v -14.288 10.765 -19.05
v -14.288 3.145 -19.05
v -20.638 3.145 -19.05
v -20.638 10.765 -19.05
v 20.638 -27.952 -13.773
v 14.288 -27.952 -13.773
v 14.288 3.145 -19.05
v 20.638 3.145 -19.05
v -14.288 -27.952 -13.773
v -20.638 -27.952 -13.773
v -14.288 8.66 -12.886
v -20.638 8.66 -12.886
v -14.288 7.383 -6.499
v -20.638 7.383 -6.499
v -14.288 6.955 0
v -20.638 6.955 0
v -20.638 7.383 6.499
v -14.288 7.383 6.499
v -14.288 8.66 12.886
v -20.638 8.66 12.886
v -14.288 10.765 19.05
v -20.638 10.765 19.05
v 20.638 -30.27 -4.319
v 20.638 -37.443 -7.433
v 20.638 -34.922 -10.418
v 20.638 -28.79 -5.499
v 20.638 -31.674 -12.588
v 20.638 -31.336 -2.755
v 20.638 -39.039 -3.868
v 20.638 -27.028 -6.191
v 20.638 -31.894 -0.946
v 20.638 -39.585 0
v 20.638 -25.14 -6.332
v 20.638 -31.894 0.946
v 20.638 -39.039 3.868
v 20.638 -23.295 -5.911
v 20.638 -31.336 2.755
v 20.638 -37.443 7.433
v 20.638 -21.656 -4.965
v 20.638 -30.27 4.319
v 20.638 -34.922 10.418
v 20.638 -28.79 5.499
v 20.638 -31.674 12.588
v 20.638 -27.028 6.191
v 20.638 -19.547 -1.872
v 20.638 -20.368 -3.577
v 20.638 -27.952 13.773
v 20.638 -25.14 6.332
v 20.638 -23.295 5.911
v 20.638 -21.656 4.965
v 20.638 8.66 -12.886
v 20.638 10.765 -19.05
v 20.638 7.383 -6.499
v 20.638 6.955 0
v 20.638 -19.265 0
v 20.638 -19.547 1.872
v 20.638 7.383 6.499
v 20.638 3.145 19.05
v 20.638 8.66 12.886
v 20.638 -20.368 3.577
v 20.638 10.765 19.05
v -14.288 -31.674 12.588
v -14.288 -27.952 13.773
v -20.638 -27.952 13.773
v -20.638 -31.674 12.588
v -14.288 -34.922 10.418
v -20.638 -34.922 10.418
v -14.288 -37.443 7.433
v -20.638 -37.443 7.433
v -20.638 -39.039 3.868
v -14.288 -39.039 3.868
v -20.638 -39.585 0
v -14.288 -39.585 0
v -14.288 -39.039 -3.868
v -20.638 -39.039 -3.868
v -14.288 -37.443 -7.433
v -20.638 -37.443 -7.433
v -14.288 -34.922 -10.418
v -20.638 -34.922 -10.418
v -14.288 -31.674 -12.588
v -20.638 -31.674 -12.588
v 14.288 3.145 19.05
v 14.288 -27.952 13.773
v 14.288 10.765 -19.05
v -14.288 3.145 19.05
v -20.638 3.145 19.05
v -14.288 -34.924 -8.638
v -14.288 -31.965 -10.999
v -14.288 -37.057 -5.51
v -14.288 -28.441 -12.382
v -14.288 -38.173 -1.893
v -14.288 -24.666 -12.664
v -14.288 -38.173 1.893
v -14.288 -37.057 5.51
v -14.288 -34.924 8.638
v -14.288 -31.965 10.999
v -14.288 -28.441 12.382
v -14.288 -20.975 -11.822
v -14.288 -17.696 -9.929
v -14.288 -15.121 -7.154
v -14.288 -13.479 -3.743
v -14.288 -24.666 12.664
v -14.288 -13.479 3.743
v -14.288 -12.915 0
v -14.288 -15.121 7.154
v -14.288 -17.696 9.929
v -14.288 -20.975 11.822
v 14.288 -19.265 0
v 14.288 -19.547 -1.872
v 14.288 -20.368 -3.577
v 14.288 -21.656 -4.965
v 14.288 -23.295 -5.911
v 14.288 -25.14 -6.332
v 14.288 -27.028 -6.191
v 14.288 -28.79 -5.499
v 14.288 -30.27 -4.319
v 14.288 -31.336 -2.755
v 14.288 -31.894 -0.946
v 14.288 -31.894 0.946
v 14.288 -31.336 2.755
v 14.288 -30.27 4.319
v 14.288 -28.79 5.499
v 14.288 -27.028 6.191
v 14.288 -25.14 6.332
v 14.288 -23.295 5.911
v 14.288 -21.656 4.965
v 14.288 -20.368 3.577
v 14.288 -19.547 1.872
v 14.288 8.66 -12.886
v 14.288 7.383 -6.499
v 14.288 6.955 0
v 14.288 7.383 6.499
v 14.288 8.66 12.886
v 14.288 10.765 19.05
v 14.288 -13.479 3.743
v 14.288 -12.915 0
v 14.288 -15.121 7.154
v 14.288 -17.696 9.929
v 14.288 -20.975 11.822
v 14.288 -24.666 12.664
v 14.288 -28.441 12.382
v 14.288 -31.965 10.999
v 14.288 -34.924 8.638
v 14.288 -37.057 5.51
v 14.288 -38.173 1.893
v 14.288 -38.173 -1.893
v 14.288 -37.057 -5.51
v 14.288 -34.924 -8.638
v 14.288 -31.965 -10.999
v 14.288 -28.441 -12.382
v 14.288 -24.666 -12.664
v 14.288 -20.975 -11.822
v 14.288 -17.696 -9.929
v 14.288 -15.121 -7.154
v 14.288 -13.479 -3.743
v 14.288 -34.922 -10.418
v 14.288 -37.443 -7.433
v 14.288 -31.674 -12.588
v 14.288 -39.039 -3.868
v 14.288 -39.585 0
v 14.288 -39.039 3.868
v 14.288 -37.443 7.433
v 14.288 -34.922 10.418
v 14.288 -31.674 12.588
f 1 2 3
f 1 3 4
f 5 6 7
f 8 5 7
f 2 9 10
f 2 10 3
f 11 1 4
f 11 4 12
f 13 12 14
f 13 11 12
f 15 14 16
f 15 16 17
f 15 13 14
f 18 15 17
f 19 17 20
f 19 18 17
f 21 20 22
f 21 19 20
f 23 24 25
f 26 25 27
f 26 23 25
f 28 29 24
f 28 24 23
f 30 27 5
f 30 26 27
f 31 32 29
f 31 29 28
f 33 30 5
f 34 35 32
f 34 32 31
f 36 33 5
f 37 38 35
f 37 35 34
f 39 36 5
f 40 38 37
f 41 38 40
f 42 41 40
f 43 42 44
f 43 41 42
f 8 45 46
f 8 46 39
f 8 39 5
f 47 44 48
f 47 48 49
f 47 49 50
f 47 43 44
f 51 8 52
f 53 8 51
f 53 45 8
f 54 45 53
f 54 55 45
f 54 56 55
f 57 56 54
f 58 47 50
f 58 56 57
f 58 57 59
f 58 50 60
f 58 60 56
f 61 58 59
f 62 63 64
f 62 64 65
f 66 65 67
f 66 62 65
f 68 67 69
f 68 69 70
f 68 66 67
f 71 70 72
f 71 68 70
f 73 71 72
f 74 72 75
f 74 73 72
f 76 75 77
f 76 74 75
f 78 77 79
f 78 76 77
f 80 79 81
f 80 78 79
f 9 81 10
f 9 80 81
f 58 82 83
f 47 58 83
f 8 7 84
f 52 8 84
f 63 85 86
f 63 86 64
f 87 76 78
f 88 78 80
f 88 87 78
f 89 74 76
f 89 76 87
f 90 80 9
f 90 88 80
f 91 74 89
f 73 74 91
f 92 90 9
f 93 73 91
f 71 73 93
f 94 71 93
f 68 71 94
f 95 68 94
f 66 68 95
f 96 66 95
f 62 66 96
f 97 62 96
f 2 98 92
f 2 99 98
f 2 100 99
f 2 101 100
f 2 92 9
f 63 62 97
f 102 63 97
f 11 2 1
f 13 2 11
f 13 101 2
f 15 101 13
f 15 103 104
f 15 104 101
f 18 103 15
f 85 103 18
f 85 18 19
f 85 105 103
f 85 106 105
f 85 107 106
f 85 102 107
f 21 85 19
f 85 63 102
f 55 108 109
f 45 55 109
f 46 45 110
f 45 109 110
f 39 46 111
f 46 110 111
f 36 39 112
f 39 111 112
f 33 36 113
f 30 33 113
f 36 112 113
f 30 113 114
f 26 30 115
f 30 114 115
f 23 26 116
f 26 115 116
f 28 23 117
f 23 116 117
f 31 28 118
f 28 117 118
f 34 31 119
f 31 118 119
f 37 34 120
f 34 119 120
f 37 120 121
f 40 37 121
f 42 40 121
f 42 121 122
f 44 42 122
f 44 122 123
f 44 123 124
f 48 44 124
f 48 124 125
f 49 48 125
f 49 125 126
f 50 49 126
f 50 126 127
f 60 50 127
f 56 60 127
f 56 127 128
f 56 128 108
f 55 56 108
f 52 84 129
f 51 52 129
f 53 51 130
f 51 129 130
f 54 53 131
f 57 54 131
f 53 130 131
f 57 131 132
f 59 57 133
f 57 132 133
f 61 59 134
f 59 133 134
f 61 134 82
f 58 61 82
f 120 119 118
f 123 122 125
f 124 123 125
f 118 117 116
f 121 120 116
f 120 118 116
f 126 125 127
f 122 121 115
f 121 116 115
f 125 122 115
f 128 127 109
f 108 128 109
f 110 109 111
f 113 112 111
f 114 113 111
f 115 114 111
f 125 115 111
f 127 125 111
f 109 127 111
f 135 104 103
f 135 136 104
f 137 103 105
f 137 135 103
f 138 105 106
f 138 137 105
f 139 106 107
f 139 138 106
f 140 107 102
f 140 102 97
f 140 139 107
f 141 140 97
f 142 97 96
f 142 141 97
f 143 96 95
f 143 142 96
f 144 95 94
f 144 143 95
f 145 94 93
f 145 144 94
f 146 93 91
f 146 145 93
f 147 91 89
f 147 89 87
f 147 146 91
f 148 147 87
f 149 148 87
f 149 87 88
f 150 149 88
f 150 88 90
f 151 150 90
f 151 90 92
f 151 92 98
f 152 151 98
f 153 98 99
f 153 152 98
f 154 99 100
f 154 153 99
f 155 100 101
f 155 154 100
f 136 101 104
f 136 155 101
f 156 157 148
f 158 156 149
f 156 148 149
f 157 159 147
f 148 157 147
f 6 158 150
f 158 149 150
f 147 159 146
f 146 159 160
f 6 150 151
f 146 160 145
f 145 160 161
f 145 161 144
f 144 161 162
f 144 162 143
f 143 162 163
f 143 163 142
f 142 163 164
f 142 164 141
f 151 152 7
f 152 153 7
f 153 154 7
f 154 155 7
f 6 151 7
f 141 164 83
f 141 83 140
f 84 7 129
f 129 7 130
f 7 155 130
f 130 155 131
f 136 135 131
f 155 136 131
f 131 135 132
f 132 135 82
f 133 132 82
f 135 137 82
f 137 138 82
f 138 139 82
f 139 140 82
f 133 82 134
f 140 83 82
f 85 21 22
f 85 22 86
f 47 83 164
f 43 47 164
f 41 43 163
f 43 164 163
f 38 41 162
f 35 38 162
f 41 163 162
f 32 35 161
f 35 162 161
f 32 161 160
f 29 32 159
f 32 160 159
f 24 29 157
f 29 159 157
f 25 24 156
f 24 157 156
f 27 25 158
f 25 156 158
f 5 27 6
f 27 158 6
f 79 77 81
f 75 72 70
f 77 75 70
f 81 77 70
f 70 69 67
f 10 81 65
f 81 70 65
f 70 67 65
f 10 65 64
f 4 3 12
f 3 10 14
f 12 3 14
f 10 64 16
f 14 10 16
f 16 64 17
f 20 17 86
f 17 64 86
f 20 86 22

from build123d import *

# Parameters (mm, degrees)
F0_R     = 12.7
F1_DEPTH = 14.2875
F2_R     = 12.7
F3_DEPTH = 6.35
F5_D     = 12.7
F5_DEPTH = 12.7
F5_TIP   = 3.8154649308


with BuildPart() as f1:
    # F0 (on Right) → F1 (new body, symmetric)
    with BuildSketch(Plane.YZ):
        with Locations((-25.6147123873, 0)):
            Circle(F0_R)
    extrude(amount=F1_DEPTH, both=True)

    # F2 (on face) → F3 (join)
    with BuildSketch(Plane.YZ.offset(14.2875)):
        with BuildLine():
            Line((10.7647620756, 19.05), (3.1447620756, 19.05))
            Line((3.1447620756, 19.05), (3.1447620756, -19.05))
            Line((3.1447620756, -19.05), (10.7647620756, -19.05))
            ThreePointArc((10.7647620756, -19.05), (6.9547620756, 0), (10.7647620756, 19.05))
        make_face()
        with BuildLine():
            Line((3.1447620756, -19.05), (3.1447620756, 19.05))
            Line((3.1447620756, 19.05), (-27.951915173, 13.7731036131))
            ThreePointArc((-27.951915173, 13.7731036131), (-16.6005519416, 10.672666558), (-11.6447123873, 0))
            ThreePointArc((-11.6447123873, 0), (-16.6005519416, -10.672666558), (-27.951915173, -13.7731036131))
            Line((-27.951915173, -13.7731036131), (3.1447620756, -19.05))
        make_face()
        with BuildLine():
            ThreePointArc((-11.6447123873, 0), (-16.6005519416, 10.672666558), (-27.951915173, 13.7731036131))
            ThreePointArc((-27.951915173, 13.7731036131), (-39.5847123873, 0), (-27.951915173, -13.7731036131))
            ThreePointArc((-27.951915173, -13.7731036131), (-16.6005519416, -10.672666558), (-11.6447123873, 0))
        make_face()
        with Locations((-25.6147123873, 0)):
            Circle(F2_R, mode=Mode.SUBTRACT)
        with Locations((-25.6147123873, 0)):
            Circle(F2_R)
    extrude(amount=F3_DEPTH)

    # F4: F1 across plane


with BuildPart() as f1_1:
    add(f1.part)
    add(f1.part.mirror(Plane.YZ))

    # F5 (one way)
    with BuildSketch(Plane(origin=(14.2875, 0, 0), x_dir=(0, 1, 0), z_dir=(-1, 0, 0))):
        with Locations((-25.6147123873, 0)):
            Circle(F5_D / 2)
    extrude(amount=-F5_DEPTH, mode=Mode.SUBTRACT)
    with Locations(Plane(origin=(14.2875, 0, 0), x_dir=(0, 1, 0), z_dir=(-1, 0, 0))):
        with Locations((-25.6147123873, 0)):
            with Locations((0, 0, -(F5_DEPTH + F5_TIP / 2))):  # 118° drill point
                Cone(0, F5_D / 2, F5_TIP, mode=Mode.SUBTRACT)


solid = f1_1.part
